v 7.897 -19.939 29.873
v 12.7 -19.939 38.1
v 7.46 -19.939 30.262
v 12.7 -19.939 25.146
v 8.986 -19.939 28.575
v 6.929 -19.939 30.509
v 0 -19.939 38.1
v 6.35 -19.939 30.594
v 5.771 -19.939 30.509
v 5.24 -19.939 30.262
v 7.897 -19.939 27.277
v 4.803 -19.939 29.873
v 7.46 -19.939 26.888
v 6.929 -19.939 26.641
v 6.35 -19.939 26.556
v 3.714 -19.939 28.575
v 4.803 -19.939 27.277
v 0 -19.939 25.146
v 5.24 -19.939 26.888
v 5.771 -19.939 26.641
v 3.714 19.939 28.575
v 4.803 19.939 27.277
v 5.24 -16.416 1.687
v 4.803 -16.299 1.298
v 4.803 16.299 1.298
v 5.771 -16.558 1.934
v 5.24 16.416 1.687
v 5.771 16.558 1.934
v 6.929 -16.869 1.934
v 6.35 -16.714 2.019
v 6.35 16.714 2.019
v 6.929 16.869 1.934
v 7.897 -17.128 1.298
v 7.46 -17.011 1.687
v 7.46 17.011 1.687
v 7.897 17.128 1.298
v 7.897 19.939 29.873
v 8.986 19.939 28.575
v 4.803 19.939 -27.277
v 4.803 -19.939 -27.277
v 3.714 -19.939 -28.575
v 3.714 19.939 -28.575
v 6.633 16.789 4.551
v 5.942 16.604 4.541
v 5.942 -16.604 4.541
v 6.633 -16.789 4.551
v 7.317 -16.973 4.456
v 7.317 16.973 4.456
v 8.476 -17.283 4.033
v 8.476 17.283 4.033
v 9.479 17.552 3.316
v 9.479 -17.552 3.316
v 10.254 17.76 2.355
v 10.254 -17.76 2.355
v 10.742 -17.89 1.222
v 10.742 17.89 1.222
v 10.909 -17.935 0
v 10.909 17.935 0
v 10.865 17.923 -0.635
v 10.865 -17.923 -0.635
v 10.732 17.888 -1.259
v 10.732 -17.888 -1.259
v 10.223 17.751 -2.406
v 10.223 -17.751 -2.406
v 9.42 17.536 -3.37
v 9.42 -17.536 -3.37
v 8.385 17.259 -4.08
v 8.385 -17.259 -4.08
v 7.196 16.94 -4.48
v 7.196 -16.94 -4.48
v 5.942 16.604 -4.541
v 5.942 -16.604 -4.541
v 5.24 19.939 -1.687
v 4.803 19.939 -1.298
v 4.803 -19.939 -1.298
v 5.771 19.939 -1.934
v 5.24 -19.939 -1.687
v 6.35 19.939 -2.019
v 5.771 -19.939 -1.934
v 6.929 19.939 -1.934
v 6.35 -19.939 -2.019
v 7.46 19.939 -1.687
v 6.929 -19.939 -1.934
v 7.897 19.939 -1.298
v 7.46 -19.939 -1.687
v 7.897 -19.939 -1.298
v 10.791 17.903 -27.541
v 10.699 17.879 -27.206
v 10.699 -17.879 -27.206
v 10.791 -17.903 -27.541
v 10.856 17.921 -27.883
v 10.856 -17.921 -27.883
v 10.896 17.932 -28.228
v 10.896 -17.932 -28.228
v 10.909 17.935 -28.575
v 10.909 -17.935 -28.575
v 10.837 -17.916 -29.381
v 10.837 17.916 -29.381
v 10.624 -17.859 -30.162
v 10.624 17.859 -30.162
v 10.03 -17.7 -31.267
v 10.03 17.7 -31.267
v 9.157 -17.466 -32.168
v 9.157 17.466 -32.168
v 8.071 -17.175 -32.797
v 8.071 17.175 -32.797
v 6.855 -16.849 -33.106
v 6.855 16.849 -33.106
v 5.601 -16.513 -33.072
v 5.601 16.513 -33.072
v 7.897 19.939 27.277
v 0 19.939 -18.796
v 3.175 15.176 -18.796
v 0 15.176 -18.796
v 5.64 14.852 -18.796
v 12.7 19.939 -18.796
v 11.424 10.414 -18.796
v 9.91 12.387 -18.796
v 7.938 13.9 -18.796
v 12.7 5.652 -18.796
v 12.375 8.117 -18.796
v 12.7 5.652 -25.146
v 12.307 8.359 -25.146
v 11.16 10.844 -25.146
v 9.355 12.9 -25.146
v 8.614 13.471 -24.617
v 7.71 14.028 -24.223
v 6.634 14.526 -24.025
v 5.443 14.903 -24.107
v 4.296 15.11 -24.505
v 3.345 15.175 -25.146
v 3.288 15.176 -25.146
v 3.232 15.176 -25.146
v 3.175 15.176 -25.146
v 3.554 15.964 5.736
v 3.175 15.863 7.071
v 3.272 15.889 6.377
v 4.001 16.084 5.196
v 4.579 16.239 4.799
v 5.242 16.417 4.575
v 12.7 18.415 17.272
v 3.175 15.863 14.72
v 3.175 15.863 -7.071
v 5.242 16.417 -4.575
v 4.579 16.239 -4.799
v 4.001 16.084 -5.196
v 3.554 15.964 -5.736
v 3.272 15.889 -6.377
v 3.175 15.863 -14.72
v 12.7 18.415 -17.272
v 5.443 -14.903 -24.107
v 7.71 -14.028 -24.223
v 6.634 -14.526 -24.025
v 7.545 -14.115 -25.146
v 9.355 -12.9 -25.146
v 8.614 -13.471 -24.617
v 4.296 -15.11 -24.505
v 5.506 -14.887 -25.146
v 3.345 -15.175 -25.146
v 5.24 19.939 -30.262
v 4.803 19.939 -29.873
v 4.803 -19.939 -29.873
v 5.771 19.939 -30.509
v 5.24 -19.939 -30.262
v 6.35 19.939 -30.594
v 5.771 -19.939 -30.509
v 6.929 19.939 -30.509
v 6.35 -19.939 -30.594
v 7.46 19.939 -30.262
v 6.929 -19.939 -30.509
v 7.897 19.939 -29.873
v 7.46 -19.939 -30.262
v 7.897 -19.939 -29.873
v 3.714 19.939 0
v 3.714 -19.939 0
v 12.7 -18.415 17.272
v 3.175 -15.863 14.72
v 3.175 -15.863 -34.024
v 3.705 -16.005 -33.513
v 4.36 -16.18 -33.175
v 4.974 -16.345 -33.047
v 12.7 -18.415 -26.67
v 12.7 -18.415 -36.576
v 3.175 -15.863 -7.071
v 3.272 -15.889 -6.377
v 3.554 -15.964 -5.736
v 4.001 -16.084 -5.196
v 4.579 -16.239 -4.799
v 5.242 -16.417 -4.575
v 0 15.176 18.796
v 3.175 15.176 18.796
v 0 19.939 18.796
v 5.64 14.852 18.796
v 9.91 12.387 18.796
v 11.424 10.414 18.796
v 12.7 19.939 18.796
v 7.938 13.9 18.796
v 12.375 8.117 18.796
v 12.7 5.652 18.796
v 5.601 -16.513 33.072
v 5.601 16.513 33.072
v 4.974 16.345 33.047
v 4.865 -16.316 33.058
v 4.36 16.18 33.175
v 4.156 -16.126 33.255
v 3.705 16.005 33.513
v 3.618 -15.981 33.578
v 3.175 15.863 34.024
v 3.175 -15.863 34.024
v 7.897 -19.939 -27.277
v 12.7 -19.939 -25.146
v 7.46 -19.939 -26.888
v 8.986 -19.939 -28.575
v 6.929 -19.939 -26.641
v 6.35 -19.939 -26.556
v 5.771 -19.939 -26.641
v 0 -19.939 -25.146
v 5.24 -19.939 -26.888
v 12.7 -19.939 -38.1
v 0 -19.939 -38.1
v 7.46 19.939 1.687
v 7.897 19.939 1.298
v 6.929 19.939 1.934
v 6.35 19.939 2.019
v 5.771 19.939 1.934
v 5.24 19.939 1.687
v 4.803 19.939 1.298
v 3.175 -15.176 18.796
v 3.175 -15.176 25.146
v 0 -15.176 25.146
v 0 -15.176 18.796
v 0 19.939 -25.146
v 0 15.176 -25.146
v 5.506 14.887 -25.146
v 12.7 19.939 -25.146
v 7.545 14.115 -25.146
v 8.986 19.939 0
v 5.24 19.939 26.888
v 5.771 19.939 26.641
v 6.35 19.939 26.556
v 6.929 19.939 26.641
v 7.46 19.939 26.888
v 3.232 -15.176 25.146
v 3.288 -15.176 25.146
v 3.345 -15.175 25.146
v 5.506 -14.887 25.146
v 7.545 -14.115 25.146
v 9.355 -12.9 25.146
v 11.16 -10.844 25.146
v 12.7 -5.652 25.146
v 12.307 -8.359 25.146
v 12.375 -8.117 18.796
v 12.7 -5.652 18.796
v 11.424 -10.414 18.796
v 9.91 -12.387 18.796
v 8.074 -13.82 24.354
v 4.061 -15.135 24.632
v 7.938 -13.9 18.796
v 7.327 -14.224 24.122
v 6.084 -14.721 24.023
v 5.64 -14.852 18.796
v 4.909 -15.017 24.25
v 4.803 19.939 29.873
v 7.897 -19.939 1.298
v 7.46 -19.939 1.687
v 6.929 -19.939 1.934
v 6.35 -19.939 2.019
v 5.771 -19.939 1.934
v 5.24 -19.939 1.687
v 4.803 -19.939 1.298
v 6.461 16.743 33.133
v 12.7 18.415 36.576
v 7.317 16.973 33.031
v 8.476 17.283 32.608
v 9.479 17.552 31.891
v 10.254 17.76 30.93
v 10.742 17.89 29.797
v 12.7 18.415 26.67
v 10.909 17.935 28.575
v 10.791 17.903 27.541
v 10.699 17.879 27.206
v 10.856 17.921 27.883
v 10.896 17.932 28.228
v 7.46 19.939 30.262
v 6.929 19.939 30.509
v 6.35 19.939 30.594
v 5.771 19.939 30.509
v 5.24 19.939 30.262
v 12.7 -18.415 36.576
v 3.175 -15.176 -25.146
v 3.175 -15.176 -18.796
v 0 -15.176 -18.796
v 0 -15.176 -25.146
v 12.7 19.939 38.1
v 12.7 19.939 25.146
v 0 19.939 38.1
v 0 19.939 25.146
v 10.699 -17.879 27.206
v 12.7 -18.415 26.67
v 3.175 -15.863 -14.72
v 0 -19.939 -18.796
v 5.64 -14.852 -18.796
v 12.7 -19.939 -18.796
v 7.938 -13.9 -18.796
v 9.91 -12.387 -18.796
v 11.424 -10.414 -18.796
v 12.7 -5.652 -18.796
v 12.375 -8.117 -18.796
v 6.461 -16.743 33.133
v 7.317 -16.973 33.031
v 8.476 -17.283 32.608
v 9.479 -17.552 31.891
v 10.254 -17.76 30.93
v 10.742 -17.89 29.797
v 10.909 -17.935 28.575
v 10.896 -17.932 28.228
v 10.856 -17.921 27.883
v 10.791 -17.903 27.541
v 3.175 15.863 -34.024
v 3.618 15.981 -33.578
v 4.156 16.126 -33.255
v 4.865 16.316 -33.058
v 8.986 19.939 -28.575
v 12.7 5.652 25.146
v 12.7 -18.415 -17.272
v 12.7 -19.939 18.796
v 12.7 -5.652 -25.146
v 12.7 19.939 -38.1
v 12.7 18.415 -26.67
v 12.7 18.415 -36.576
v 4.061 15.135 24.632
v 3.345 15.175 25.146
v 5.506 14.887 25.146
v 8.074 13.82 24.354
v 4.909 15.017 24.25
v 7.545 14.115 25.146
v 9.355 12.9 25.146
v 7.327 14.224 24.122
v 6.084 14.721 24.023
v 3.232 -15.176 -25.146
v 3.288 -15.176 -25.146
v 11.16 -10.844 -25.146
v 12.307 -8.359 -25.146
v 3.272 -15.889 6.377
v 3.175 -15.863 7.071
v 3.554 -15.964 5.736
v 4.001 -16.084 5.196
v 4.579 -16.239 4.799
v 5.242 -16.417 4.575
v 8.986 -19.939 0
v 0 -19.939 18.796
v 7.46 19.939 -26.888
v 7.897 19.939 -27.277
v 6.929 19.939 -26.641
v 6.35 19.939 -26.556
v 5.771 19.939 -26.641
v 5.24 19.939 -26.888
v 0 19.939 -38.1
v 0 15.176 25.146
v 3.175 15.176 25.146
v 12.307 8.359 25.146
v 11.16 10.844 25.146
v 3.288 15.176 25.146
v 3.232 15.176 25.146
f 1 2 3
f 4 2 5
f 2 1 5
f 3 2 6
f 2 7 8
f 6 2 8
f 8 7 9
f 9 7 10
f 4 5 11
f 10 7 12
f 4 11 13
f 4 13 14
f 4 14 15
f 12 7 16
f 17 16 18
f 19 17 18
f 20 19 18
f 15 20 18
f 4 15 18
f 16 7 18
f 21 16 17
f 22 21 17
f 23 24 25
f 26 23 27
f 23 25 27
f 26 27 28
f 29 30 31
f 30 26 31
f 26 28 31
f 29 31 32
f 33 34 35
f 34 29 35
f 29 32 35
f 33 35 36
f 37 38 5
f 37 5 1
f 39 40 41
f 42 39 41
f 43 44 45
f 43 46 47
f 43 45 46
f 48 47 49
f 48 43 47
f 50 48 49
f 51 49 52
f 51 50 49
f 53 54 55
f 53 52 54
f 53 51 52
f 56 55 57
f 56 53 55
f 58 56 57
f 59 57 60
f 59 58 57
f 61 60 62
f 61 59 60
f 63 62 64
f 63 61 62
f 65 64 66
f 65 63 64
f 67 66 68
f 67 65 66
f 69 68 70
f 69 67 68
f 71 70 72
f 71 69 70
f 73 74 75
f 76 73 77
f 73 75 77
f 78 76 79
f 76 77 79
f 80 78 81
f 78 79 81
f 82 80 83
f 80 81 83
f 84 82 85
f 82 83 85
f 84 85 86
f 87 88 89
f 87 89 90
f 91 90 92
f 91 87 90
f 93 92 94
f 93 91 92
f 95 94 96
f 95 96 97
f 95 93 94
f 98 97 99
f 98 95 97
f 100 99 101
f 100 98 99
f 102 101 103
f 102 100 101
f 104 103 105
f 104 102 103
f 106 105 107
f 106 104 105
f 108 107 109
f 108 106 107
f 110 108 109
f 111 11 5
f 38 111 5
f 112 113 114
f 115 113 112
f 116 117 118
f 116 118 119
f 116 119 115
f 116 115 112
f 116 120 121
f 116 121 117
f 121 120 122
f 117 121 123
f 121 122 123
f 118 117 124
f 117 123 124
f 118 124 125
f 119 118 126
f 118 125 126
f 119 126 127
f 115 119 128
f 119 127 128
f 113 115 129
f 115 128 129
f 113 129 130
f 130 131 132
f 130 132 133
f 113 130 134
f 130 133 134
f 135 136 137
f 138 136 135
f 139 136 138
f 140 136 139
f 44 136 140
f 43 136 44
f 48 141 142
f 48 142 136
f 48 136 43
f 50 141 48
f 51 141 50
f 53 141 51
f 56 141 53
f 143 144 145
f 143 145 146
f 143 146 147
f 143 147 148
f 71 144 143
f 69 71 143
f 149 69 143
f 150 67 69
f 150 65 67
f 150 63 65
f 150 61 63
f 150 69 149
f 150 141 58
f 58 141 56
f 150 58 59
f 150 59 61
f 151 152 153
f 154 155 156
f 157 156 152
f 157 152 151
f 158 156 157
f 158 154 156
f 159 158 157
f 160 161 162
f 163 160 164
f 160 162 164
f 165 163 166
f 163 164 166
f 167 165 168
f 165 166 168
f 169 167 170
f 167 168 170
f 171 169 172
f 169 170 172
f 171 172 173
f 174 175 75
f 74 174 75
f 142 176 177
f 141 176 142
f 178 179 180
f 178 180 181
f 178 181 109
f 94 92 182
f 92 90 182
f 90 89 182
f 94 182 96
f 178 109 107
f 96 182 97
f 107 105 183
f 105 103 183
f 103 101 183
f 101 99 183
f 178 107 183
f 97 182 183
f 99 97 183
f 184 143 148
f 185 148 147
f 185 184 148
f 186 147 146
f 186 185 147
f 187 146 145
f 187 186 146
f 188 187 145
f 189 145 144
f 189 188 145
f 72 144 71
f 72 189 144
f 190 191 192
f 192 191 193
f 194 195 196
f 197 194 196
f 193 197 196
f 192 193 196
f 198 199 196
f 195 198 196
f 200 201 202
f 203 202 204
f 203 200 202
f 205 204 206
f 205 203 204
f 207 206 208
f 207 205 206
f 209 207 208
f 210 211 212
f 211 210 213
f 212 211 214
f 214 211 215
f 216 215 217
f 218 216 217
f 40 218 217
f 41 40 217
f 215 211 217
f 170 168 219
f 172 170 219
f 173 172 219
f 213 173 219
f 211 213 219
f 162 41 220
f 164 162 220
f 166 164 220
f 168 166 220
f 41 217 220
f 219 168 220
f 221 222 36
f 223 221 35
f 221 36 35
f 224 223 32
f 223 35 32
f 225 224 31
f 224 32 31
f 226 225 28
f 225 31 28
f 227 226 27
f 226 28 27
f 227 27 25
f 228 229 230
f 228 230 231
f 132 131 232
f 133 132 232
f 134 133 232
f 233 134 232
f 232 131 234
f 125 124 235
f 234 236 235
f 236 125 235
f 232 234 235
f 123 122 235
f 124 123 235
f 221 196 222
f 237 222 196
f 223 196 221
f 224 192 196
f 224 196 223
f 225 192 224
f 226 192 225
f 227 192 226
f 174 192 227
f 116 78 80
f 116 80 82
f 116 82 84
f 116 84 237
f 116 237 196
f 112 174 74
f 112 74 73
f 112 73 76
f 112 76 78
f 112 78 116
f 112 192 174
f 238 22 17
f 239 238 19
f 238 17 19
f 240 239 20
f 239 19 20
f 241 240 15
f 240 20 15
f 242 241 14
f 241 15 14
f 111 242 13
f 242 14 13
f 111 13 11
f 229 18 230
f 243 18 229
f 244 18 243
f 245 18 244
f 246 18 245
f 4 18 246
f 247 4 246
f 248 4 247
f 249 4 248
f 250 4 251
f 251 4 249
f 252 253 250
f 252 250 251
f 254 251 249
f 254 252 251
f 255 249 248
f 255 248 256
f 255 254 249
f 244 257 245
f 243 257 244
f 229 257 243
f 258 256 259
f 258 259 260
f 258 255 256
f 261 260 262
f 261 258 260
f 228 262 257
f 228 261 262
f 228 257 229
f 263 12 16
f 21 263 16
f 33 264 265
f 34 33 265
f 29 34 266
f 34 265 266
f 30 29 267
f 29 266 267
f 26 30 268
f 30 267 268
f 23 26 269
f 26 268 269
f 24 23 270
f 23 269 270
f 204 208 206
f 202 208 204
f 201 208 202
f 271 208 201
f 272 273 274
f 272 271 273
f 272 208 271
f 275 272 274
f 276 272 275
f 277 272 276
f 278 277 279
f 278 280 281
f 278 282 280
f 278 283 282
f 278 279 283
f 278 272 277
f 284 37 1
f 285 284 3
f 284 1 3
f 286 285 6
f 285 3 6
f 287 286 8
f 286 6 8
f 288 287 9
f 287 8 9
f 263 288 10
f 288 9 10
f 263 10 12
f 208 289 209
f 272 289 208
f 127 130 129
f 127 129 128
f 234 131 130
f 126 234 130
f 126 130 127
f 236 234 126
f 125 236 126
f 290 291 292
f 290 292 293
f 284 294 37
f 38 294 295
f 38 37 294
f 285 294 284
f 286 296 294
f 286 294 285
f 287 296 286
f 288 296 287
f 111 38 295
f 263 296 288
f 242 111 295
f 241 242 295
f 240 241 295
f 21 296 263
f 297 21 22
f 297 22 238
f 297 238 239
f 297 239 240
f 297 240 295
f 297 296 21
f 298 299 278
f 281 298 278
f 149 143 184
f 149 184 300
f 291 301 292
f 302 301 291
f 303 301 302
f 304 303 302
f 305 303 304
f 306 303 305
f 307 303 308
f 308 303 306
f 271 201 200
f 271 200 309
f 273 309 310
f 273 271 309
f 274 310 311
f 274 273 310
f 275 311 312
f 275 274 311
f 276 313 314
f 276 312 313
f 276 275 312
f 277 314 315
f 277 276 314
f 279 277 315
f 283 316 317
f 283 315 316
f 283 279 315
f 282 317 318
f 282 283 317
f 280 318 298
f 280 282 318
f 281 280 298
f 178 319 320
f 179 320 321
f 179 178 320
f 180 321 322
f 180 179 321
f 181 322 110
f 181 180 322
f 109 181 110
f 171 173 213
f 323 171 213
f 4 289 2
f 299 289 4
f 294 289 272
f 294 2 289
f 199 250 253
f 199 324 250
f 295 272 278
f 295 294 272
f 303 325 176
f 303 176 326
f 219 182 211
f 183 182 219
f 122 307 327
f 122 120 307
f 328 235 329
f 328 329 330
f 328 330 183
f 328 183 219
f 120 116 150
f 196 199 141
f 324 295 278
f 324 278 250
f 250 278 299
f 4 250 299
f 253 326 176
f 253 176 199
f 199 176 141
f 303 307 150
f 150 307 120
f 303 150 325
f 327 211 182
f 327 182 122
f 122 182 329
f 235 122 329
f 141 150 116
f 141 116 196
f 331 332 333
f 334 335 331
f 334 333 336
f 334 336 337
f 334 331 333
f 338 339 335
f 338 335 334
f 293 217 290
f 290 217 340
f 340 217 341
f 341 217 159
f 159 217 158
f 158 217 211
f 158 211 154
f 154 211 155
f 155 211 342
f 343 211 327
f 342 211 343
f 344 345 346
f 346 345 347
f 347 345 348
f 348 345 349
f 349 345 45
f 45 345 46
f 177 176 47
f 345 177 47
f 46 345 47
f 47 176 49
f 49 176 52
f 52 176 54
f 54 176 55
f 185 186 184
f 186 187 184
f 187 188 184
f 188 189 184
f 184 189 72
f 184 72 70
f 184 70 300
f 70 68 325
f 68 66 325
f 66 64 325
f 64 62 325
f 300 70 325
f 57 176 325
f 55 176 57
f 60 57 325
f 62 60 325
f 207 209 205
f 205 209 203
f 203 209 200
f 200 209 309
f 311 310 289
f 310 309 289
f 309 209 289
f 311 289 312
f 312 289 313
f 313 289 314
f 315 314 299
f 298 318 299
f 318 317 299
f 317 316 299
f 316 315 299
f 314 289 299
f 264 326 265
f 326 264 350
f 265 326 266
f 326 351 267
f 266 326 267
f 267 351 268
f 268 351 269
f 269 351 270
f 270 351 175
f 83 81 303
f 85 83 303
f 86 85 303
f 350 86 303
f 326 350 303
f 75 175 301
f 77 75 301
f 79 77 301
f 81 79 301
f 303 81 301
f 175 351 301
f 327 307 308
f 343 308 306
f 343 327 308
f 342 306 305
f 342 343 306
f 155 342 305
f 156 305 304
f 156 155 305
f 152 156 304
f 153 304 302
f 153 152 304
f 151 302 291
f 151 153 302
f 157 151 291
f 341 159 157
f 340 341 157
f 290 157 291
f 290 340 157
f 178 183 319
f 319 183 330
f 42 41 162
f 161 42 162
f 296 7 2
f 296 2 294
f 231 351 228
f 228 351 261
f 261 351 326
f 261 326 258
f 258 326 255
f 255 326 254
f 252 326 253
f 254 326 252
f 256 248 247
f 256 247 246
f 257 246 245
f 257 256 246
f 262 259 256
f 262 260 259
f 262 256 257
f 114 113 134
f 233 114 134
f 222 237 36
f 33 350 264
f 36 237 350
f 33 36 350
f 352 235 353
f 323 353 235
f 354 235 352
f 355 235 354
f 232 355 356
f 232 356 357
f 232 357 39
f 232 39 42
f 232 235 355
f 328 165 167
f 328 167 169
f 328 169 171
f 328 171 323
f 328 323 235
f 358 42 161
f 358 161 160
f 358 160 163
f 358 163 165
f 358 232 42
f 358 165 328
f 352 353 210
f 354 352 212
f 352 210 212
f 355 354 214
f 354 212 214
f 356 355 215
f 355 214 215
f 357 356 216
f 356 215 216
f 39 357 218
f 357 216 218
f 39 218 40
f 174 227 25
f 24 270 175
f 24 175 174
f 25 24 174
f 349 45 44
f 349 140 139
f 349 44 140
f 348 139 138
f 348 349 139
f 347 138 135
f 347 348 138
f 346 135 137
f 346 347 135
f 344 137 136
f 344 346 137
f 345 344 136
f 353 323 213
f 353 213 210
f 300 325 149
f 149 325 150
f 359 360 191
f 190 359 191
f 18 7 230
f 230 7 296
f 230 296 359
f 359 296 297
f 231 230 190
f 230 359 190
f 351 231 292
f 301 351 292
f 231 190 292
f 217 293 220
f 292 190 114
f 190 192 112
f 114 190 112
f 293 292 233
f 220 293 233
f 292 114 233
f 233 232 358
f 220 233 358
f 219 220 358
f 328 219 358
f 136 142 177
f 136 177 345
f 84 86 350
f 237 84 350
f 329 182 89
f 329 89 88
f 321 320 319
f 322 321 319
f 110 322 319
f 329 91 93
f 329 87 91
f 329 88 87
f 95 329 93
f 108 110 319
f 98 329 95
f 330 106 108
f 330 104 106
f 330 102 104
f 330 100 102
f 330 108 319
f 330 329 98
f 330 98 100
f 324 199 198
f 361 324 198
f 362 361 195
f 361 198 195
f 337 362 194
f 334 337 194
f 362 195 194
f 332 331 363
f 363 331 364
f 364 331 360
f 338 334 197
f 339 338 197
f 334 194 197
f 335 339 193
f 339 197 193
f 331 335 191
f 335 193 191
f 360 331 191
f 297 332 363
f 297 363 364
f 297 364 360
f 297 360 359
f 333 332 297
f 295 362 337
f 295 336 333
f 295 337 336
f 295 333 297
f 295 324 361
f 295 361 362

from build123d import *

# Parameters (mm, degrees)
SKETCH1_W                    = 76.2
SKETCH1_H                    = 39.878
BOSS_EXTRUDE1_DEPTH          = 12.7
SKETCH2_W                    = 6.35
SKETCH2_H                    = 4.7625
CUT_EXTRUDE1_DEPTH           = 45.83819489
F_10_32_TAPPED_HOLE1_D       = 4.0386
FILLET1_R                    = 9.525
SKETCH6_W                    = 34.544
SKETCH6_H                    = 36.83
CUT_EXTRUDE3_DEPTH           = 9.525
CUT_EXTRUDE3_DRAFT           = -15
SKETCH6_W_2                  = 9.906
CUT_EXTRUDE3_PROFILE_2_DEPTH = 9.525
CUT_EXTRUDE3_PROFILE_2_DRAFT = -15
CUT_EXTRUDE3_PROFILE_3_DEPTH = 9.525
CUT_EXTRUDE3_PROFILE_3_DRAFT = -15
SKETCH7_R                    = 4.5593
SKETCH7_R_2                  = 2.0193
EXTRUDE_THIN1_DEPTH          = 39.878
DELETEFACE1_START            = 18.796
DELETEFACE1_DEPTH            = 6.35
DELETEFACE1_START_2          = -25.146
DELETEFACE1_2_DEPTH          = 6.35
FILLET2_R                    = 2.54
CUT_EXTRUDE4_DEPTH           = 57.596421146


with BuildPart() as part:
    # Sketch1 → Boss-Extrude1 (new body)
    with BuildSketch(Plane(origin=(0, 0, 0), x_dir=(0, 0, -1), z_dir=(1, 0, 0))):
        Rectangle(SKETCH1_W, SKETCH1_H)
    extrude(amount=BOSS_EXTRUDE1_DEPTH)

    # Sketch2 → Cut-Extrude1 (cut, through all)
    with BuildSketch(Plane(origin=(12.7, 0, 0), x_dir=(0, 0, -1), z_dir=(1, 0, 0))):
        with Locations((-21.971, 17.55775)):
            Rectangle(SKETCH2_W, SKETCH2_H)
        with Locations((21.971, 17.55775)):
            Rectangle(SKETCH2_W, SKETCH2_H)
        with Locations((-21.971, -17.55775)):
            Rectangle(SKETCH2_W, SKETCH2_H)
        with Locations((21.971, -17.55775)):
            Rectangle(SKETCH2_W, SKETCH2_H)
    extrude(amount=-CUT_EXTRUDE1_DEPTH, mode=Mode.SUBTRACT)

    # #10-32 Tapped Hole1 (through all)
    with Locations(Plane(origin=(0, 19.939, 0), x_dir=(1, 0, 0), z_dir=(0, 1, 0))):
        with Locations((6.35, 28.575), (6.35, 0), (6.35, -28.575)):
            Hole(F_10_32_TAPPED_HOLE1_D / 2)

    # Fillet1
    fillet1_edges = [part.edges().sort_by_distance(p)[0] for p in [
        (12.7, 15.1765, -21.971),
        (12.7, -15.1765, 21.971),
        (12.7, -15.1765, -21.971),
        (12.7, 15.1765, 21.971),
    ]]
    fillet(fillet1_edges, radius=FILLET1_R)


with BuildPart() as cut_extrude3_tool:
    # Sketch6 → Cut-Extrude3 (with draft: the straight prism first)
    with BuildSketch(Plane(origin=(12.7, 0, 0), x_dir=(0, 0, -1), z_dir=(1, 0, 0))):
        Rectangle(SKETCH6_W, SKETCH6_H)
    extrude(amount=-CUT_EXTRUDE3_DEPTH)
    # Cut-Extrude3: the draft: its side faces are tilted about the plane it starts from
    cut_extrude3_sides = [cut_extrude3_tool.faces().sort_by_distance(p)[0] for p in [
        (7.9375, 0, 17.272),
        (7.9375, -18.415, 0),
        (7.9375, 0, -17.272),
        (7.9375, 18.415, 0),
    ]]
    draft(cut_extrude3_sides, Plane(origin=(12.7, 0, 0), x_dir=(0, 0, -1), z_dir=(1, 0, 0)), CUT_EXTRUDE3_DRAFT)


with BuildPart() as part_1:
    add(part.part)

    # Cut-Extrude3: cut by cut_extrude3_tool
    add(cut_extrude3_tool.part, mode=Mode.SUBTRACT)


with BuildPart() as cut_extrude3_profile_2_tool:
    # Sketch6 → Cut-Extrude3 profile 2 (with draft: the straight prism first)
    with BuildSketch(Plane(origin=(12.7, 0, 0), x_dir=(0, 0, -1), z_dir=(1, 0, 0))):
        with Locations((31.623, 0)):
            Rectangle(SKETCH6_W_2, SKETCH6_H)
    extrude(amount=-CUT_EXTRUDE3_PROFILE_2_DEPTH)
    # Cut-Extrude3 profile 2: the draft: its side faces are tilted about the plane it starts from
    cut_extrude3_profile_2_sides = [cut_extrude3_profile_2_tool.faces().sort_by_distance(p)[0] for p in [
        (7.9375, 0, -26.67),
        (7.9375, -18.415, -31.623),
        (7.9375, 0, -36.576),
        (7.9375, 18.415, -31.623),
    ]]
    draft(cut_extrude3_profile_2_sides, Plane(origin=(12.7, 0, 0), x_dir=(0, 0, -1), z_dir=(1, 0, 0)), CUT_EXTRUDE3_PROFILE_2_DRAFT)


with BuildPart() as part_2:
    add(part_1.part)

    # Cut-Extrude3 profile 2: cut by cut_extrude3_profile_2_tool
    add(cut_extrude3_profile_2_tool.part, mode=Mode.SUBTRACT)


with BuildPart() as cut_extrude3_profile_3_tool:
    # Sketch6 → Cut-Extrude3 profile 3 (with draft: the straight prism first)
    with BuildSketch(Plane(origin=(12.7, 0, 0), x_dir=(0, 0, -1), z_dir=(1, 0, 0))):
        with Locations((-31.623, 0)):
            Rectangle(SKETCH6_W_2, SKETCH6_H)
    extrude(amount=-CUT_EXTRUDE3_PROFILE_3_DEPTH)
    # Cut-Extrude3 profile 3: the draft: its side faces are tilted about the plane it starts from
    cut_extrude3_profile_3_sides = [cut_extrude3_profile_3_tool.faces().sort_by_distance(p)[0] for p in [
        (7.9375, 0, 36.576),
        (7.9375, -18.415, 31.623),
        (7.9375, 0, 26.67),
        (7.9375, 18.415, 31.623),
    ]]
    draft(cut_extrude3_profile_3_sides, Plane(origin=(12.7, 0, 0), x_dir=(0, 0, -1), z_dir=(1, 0, 0)), CUT_EXTRUDE3_PROFILE_3_DRAFT)


with BuildPart() as part_3:
    add(part_2.part)

    # Cut-Extrude3 profile 3: cut by cut_extrude3_profile_3_tool
    add(cut_extrude3_profile_3_tool.part, mode=Mode.SUBTRACT)

    # Sketch7 → Extrude-Thin1 (add, through all)
    # profile 1 of 3: a face of its own
    with BuildSketch(Plane(origin=(0, 19.939, 0), x_dir=(1, 0, 0), z_dir=(0, 1, 0))):
        with Locations((6.35, -28.575)):
            Circle(SKETCH7_R)
        with Locations((6.35, -28.575)):
            Circle(SKETCH7_R_2, mode=Mode.SUBTRACT)
    # profile 2 of 3: a face of its own
    with BuildSketch(Plane(origin=(0, 19.939, 0), x_dir=(1, 0, 0), z_dir=(0, 1, 0))):
        with Locations((6.35, 0)):
            Circle(SKETCH7_R)
        with Locations((6.35, 0)):
            Circle(SKETCH7_R_2, mode=Mode.SUBTRACT)
    # profile 3 of 3: a face of its own
    with BuildSketch(Plane(origin=(0, 19.939, 0), x_dir=(1, 0, 0), z_dir=(0, 1, 0))):
        with Locations((6.35, 28.575)):
            Circle(SKETCH7_R)
        with Locations((6.35, 28.575)):
            Circle(SKETCH7_R_2, mode=Mode.SUBTRACT)
    extrude(amount=-EXTRUDE_THIN1_DEPTH)

    # DeleteFace1: read off the stored shape, not the designer's step
    # DeleteFace1 outline → DeleteFace1 (cut)
    with BuildSketch(Plane.XY.offset(DELETEFACE1_START)):
        with BuildLine():
            ThreePointArc((3.175, 15.1765), (9.910192091, 12.386692091), (12.7, 5.6515))
            Line((12.7, 5.6515), (12.7, 19.939))
            Line((12.7, 19.939), (0, 19.939))
            Line((0, 19.939), (0, 15.1765))
            Line((0, 15.1765), (3.175, 15.1765))
        make_face()
        with BuildLine():
            Line((12.7, -19.939), (12.7, -5.6515))
            ThreePointArc((12.7, -5.6515), (9.910192091, -12.386692091), (3.175, -15.1765))
            Line((3.175, -15.1765), (0, -15.1765))
            Line((0, -15.1765), (0, -19.939))
            Line((0, -19.939), (12.7, -19.939))
        make_face()
    extrude(amount=DELETEFACE1_DEPTH, mode=Mode.SUBTRACT)

    # DeleteFace1 2 outline → DeleteFace1 2 (cut)
    with BuildSketch(Plane.XY.offset(DELETEFACE1_START_2)):
        with BuildLine():
            ThreePointArc((3.175, 15.1765), (9.910192091, 12.386692091), (12.7, 5.6515))
            Line((12.7, 5.6515), (12.7, 19.939))
            Line((12.7, 19.939), (0, 19.939))
            Line((0, 19.939), (0, 15.1765))
            Line((0, 15.1765), (3.175, 15.1765))
        make_face()
        with BuildLine():
            Line((12.7, -19.939), (12.7, -5.6515))
            ThreePointArc((12.7, -5.6515), (9.910192091, -12.386692091), (3.175, -15.1765))
            Line((3.175, -15.1765), (0, -15.1765))
            Line((0, -15.1765), (0, -19.939))
            Line((0, -19.939), (12.7, -19.939))
        make_face()
    extrude(amount=DELETEFACE1_2_DEPTH, mode=Mode.SUBTRACT)

    # Fillet2
    # the kernel refuses this fillet: 2.54 mm, written as the material it adds along each edge
    with BuildSketch(Plane(origin=(3.175, -25.359661976, -3.27209283), x_dir=(0, 0, -1), z_dir=(0, 1, 0))) as fillet2_piece_1_section:
        with BuildLine():
            CenterArc((3.798751213, -2.54), FILLET2_R, 90, 95.131704374)
            ThreePointArc((1.268932235, -2.767191413), (0.872245463, -1.274558842), (0, 0))
            Line((0, 0), (3.798751213, 0))
        make_face()
    fillet2_piece_1 = extrude(amount=50.719323951, mode=Mode.PRIVATE)
    fillet2_piece_1 = split(fillet2_piece_1, bisect_by=Plane(origin=(5.549219508, -16.498954142, -3.27209283), z_dir=(0.25881904510252135, 0.9659258262890681, 0)), keep=Keep.TOP, mode=Mode.PRIVATE)
    fillet2_piece_1 = split(fillet2_piece_1, bisect_by=Plane(origin=(-7.130611479, 13.101403669, -3.27209283), z_dir=(0.25881904510252135, -0.9659258262890681, 0)), keep=Keep.TOP, mode=Mode.PRIVATE)
    add(fillet2_piece_1)
    with BuildSketch(Plane(origin=(3.175, -25.359661976, 3.27209283), x_dir=(0.9089856543258207, 0, 0.4168273986074566), z_dir=(0, 1, 0))) as fillet2_piece_2_section:
        with BuildLine():
            CenterArc((3.892247148, -2.394268765), FILLET2_R, 109.502744929, 95.131704374)
            Line((1.583423586, -3.453010357), (0, 0))
            ThreePointArc((0, 0), (1.52213151, -0.261587567), (3.04426302, 0))
        make_face()
    fillet2_piece_2 = extrude(amount=50.719323951, mode=Mode.PRIVATE)
    fillet2_piece_2 = split(fillet2_piece_2, bisect_by=Plane(origin=(5.549219508, -16.498954142, 3.27209283), z_dir=(0.25881904510252135, 0.9659258262890681, 0)), keep=Keep.TOP, mode=Mode.PRIVATE)
    fillet2_piece_2 = split(fillet2_piece_2, bisect_by=Plane(origin=(-7.130611479, 13.101403669, 3.27209283), z_dir=(0.25881904510252135, -0.9659258262890681, 0)), keep=Keep.TOP, mode=Mode.PRIVATE)
    add(fillet2_piece_2)
    with BuildSketch(Plane(origin=(3.175, -22.657937307, -31.84709283), x_dir=(0, 0, -1), z_dir=(0, 1, 0))) as fillet2_piece_3_section:
        with BuildLine():
            CenterArc((3.73080949, -2.009058502), FILLET2_R, 127.723943203, 61.728755264)
            ThreePointArc((1.225298821, -2.426211095), (0.797654993, -1.119672984), (0, 0))
            Line((0, 0), (2.176691112, 0))
        make_face()
    fillet2_piece_3 = extrude(amount=45.315874614, mode=Mode.PRIVATE)
    fillet2_piece_3 = split(fillet2_piece_3, bisect_by=Plane(origin=(4.873788341, -16.317972906, -31.84709283), z_dir=(0.25881904510252135, 0.9659258262890681, 0)), keep=Keep.TOP, mode=Mode.PRIVATE)
    fillet2_piece_3 = split(fillet2_piece_3, bisect_by=Plane(origin=(-6.455180312, 13.282384904, -31.84709283), z_dir=(0.25881904510252135, -0.9659258262890681, 0)), keep=Keep.TOP, mode=Mode.PRIVATE)
    add(fillet2_piece_3)
    with BuildSketch(Plane(origin=(3.175, -22.657937307, 31.84709283), x_dir=(0.8926255836617852, 0, 0.4507988103272426), z_dir=(0, 1, 0))) as fillet2_piece_4_section:
        with BuildLine():
            CenterArc((3.475181498, -2.424534816), FILLET2_R, 107.342247882, 61.728755264)
            Line((0.981249764, -1.942970174), (0, 0))
            ThreePointArc((0, 0), (1.359030673, -0.207260005), (2.718061346, 0))
        make_face()
    fillet2_piece_4 = extrude(amount=45.315874614, mode=Mode.PRIVATE)
    fillet2_piece_4 = split(fillet2_piece_4, bisect_by=Plane(origin=(-6.455180312, 13.282384904, 31.84709283), z_dir=(0.25881904510252135, -0.9659258262890681, 0)), keep=Keep.TOP, mode=Mode.PRIVATE)
    fillet2_piece_4 = split(fillet2_piece_4, bisect_by=Plane(origin=(4.873788341, -16.317972906, 31.84709283), z_dir=(0.25881904510252135, 0.9659258262890681, 0)), keep=Keep.TOP, mode=Mode.PRIVATE)
    add(fillet2_piece_4)

    # Sketch8 → Cut-Extrude4 (cut, through all)
    with BuildSketch(Plane.XZ.offset(19.939)):
        with BuildLine():
            Line((8.986008939, 28.575), (7.896873544, 29.87298102))
            ThreePointArc((7.896873544, 29.87298102), (6.35, 30.5943), (4.803126456, 29.87298102))
            Line((4.803126456, 29.87298102), (3.713991061, 28.575))
            Line((3.713991061, 28.575), (4.803126456, 27.27701898))
            ThreePointArc((4.803126456, 27.27701898), (6.35, 26.5557), (7.896873544, 27.27701898))
            Line((7.896873544, 27.27701898), (8.986008939, 28.575))
        make_face()
        with BuildLine():
            Line((8.986008939, 0), (7.896873544, 1.29798102))
            ThreePointArc((7.896873544, 1.29798102), (6.35, 2.0193), (4.803126456, 1.29798102))
            Line((4.803126456, 1.29798102), (3.713991061, 0))
            Line((3.713991061, 0), (4.803126456, -1.29798102))
            ThreePointArc((4.803126456, -1.29798102), (6.35, -2.0193), (7.896873544, -1.29798102))
            Line((7.896873544, -1.29798102), (8.986008939, 0))
        make_face()
        with BuildLine():
            Line((8.986008939, -28.575), (7.896873544, -27.27701898))
            ThreePointArc((7.896873544, -27.27701898), (6.35, -26.5557), (4.803126456, -27.27701898))
            Line((4.803126456, -27.27701898), (3.713991061, -28.575))
            Line((3.713991061, -28.575), (4.803126456, -29.87298102))
            ThreePointArc((4.803126456, -29.87298102), (6.35, -30.5943), (7.896873544, -29.87298102))
            Line((7.896873544, -29.87298102), (8.986008939, -28.575))
        make_face()
    extrude(amount=-CUT_EXTRUDE4_DEPTH, mode=Mode.SUBTRACT)


solid = part_3.part
